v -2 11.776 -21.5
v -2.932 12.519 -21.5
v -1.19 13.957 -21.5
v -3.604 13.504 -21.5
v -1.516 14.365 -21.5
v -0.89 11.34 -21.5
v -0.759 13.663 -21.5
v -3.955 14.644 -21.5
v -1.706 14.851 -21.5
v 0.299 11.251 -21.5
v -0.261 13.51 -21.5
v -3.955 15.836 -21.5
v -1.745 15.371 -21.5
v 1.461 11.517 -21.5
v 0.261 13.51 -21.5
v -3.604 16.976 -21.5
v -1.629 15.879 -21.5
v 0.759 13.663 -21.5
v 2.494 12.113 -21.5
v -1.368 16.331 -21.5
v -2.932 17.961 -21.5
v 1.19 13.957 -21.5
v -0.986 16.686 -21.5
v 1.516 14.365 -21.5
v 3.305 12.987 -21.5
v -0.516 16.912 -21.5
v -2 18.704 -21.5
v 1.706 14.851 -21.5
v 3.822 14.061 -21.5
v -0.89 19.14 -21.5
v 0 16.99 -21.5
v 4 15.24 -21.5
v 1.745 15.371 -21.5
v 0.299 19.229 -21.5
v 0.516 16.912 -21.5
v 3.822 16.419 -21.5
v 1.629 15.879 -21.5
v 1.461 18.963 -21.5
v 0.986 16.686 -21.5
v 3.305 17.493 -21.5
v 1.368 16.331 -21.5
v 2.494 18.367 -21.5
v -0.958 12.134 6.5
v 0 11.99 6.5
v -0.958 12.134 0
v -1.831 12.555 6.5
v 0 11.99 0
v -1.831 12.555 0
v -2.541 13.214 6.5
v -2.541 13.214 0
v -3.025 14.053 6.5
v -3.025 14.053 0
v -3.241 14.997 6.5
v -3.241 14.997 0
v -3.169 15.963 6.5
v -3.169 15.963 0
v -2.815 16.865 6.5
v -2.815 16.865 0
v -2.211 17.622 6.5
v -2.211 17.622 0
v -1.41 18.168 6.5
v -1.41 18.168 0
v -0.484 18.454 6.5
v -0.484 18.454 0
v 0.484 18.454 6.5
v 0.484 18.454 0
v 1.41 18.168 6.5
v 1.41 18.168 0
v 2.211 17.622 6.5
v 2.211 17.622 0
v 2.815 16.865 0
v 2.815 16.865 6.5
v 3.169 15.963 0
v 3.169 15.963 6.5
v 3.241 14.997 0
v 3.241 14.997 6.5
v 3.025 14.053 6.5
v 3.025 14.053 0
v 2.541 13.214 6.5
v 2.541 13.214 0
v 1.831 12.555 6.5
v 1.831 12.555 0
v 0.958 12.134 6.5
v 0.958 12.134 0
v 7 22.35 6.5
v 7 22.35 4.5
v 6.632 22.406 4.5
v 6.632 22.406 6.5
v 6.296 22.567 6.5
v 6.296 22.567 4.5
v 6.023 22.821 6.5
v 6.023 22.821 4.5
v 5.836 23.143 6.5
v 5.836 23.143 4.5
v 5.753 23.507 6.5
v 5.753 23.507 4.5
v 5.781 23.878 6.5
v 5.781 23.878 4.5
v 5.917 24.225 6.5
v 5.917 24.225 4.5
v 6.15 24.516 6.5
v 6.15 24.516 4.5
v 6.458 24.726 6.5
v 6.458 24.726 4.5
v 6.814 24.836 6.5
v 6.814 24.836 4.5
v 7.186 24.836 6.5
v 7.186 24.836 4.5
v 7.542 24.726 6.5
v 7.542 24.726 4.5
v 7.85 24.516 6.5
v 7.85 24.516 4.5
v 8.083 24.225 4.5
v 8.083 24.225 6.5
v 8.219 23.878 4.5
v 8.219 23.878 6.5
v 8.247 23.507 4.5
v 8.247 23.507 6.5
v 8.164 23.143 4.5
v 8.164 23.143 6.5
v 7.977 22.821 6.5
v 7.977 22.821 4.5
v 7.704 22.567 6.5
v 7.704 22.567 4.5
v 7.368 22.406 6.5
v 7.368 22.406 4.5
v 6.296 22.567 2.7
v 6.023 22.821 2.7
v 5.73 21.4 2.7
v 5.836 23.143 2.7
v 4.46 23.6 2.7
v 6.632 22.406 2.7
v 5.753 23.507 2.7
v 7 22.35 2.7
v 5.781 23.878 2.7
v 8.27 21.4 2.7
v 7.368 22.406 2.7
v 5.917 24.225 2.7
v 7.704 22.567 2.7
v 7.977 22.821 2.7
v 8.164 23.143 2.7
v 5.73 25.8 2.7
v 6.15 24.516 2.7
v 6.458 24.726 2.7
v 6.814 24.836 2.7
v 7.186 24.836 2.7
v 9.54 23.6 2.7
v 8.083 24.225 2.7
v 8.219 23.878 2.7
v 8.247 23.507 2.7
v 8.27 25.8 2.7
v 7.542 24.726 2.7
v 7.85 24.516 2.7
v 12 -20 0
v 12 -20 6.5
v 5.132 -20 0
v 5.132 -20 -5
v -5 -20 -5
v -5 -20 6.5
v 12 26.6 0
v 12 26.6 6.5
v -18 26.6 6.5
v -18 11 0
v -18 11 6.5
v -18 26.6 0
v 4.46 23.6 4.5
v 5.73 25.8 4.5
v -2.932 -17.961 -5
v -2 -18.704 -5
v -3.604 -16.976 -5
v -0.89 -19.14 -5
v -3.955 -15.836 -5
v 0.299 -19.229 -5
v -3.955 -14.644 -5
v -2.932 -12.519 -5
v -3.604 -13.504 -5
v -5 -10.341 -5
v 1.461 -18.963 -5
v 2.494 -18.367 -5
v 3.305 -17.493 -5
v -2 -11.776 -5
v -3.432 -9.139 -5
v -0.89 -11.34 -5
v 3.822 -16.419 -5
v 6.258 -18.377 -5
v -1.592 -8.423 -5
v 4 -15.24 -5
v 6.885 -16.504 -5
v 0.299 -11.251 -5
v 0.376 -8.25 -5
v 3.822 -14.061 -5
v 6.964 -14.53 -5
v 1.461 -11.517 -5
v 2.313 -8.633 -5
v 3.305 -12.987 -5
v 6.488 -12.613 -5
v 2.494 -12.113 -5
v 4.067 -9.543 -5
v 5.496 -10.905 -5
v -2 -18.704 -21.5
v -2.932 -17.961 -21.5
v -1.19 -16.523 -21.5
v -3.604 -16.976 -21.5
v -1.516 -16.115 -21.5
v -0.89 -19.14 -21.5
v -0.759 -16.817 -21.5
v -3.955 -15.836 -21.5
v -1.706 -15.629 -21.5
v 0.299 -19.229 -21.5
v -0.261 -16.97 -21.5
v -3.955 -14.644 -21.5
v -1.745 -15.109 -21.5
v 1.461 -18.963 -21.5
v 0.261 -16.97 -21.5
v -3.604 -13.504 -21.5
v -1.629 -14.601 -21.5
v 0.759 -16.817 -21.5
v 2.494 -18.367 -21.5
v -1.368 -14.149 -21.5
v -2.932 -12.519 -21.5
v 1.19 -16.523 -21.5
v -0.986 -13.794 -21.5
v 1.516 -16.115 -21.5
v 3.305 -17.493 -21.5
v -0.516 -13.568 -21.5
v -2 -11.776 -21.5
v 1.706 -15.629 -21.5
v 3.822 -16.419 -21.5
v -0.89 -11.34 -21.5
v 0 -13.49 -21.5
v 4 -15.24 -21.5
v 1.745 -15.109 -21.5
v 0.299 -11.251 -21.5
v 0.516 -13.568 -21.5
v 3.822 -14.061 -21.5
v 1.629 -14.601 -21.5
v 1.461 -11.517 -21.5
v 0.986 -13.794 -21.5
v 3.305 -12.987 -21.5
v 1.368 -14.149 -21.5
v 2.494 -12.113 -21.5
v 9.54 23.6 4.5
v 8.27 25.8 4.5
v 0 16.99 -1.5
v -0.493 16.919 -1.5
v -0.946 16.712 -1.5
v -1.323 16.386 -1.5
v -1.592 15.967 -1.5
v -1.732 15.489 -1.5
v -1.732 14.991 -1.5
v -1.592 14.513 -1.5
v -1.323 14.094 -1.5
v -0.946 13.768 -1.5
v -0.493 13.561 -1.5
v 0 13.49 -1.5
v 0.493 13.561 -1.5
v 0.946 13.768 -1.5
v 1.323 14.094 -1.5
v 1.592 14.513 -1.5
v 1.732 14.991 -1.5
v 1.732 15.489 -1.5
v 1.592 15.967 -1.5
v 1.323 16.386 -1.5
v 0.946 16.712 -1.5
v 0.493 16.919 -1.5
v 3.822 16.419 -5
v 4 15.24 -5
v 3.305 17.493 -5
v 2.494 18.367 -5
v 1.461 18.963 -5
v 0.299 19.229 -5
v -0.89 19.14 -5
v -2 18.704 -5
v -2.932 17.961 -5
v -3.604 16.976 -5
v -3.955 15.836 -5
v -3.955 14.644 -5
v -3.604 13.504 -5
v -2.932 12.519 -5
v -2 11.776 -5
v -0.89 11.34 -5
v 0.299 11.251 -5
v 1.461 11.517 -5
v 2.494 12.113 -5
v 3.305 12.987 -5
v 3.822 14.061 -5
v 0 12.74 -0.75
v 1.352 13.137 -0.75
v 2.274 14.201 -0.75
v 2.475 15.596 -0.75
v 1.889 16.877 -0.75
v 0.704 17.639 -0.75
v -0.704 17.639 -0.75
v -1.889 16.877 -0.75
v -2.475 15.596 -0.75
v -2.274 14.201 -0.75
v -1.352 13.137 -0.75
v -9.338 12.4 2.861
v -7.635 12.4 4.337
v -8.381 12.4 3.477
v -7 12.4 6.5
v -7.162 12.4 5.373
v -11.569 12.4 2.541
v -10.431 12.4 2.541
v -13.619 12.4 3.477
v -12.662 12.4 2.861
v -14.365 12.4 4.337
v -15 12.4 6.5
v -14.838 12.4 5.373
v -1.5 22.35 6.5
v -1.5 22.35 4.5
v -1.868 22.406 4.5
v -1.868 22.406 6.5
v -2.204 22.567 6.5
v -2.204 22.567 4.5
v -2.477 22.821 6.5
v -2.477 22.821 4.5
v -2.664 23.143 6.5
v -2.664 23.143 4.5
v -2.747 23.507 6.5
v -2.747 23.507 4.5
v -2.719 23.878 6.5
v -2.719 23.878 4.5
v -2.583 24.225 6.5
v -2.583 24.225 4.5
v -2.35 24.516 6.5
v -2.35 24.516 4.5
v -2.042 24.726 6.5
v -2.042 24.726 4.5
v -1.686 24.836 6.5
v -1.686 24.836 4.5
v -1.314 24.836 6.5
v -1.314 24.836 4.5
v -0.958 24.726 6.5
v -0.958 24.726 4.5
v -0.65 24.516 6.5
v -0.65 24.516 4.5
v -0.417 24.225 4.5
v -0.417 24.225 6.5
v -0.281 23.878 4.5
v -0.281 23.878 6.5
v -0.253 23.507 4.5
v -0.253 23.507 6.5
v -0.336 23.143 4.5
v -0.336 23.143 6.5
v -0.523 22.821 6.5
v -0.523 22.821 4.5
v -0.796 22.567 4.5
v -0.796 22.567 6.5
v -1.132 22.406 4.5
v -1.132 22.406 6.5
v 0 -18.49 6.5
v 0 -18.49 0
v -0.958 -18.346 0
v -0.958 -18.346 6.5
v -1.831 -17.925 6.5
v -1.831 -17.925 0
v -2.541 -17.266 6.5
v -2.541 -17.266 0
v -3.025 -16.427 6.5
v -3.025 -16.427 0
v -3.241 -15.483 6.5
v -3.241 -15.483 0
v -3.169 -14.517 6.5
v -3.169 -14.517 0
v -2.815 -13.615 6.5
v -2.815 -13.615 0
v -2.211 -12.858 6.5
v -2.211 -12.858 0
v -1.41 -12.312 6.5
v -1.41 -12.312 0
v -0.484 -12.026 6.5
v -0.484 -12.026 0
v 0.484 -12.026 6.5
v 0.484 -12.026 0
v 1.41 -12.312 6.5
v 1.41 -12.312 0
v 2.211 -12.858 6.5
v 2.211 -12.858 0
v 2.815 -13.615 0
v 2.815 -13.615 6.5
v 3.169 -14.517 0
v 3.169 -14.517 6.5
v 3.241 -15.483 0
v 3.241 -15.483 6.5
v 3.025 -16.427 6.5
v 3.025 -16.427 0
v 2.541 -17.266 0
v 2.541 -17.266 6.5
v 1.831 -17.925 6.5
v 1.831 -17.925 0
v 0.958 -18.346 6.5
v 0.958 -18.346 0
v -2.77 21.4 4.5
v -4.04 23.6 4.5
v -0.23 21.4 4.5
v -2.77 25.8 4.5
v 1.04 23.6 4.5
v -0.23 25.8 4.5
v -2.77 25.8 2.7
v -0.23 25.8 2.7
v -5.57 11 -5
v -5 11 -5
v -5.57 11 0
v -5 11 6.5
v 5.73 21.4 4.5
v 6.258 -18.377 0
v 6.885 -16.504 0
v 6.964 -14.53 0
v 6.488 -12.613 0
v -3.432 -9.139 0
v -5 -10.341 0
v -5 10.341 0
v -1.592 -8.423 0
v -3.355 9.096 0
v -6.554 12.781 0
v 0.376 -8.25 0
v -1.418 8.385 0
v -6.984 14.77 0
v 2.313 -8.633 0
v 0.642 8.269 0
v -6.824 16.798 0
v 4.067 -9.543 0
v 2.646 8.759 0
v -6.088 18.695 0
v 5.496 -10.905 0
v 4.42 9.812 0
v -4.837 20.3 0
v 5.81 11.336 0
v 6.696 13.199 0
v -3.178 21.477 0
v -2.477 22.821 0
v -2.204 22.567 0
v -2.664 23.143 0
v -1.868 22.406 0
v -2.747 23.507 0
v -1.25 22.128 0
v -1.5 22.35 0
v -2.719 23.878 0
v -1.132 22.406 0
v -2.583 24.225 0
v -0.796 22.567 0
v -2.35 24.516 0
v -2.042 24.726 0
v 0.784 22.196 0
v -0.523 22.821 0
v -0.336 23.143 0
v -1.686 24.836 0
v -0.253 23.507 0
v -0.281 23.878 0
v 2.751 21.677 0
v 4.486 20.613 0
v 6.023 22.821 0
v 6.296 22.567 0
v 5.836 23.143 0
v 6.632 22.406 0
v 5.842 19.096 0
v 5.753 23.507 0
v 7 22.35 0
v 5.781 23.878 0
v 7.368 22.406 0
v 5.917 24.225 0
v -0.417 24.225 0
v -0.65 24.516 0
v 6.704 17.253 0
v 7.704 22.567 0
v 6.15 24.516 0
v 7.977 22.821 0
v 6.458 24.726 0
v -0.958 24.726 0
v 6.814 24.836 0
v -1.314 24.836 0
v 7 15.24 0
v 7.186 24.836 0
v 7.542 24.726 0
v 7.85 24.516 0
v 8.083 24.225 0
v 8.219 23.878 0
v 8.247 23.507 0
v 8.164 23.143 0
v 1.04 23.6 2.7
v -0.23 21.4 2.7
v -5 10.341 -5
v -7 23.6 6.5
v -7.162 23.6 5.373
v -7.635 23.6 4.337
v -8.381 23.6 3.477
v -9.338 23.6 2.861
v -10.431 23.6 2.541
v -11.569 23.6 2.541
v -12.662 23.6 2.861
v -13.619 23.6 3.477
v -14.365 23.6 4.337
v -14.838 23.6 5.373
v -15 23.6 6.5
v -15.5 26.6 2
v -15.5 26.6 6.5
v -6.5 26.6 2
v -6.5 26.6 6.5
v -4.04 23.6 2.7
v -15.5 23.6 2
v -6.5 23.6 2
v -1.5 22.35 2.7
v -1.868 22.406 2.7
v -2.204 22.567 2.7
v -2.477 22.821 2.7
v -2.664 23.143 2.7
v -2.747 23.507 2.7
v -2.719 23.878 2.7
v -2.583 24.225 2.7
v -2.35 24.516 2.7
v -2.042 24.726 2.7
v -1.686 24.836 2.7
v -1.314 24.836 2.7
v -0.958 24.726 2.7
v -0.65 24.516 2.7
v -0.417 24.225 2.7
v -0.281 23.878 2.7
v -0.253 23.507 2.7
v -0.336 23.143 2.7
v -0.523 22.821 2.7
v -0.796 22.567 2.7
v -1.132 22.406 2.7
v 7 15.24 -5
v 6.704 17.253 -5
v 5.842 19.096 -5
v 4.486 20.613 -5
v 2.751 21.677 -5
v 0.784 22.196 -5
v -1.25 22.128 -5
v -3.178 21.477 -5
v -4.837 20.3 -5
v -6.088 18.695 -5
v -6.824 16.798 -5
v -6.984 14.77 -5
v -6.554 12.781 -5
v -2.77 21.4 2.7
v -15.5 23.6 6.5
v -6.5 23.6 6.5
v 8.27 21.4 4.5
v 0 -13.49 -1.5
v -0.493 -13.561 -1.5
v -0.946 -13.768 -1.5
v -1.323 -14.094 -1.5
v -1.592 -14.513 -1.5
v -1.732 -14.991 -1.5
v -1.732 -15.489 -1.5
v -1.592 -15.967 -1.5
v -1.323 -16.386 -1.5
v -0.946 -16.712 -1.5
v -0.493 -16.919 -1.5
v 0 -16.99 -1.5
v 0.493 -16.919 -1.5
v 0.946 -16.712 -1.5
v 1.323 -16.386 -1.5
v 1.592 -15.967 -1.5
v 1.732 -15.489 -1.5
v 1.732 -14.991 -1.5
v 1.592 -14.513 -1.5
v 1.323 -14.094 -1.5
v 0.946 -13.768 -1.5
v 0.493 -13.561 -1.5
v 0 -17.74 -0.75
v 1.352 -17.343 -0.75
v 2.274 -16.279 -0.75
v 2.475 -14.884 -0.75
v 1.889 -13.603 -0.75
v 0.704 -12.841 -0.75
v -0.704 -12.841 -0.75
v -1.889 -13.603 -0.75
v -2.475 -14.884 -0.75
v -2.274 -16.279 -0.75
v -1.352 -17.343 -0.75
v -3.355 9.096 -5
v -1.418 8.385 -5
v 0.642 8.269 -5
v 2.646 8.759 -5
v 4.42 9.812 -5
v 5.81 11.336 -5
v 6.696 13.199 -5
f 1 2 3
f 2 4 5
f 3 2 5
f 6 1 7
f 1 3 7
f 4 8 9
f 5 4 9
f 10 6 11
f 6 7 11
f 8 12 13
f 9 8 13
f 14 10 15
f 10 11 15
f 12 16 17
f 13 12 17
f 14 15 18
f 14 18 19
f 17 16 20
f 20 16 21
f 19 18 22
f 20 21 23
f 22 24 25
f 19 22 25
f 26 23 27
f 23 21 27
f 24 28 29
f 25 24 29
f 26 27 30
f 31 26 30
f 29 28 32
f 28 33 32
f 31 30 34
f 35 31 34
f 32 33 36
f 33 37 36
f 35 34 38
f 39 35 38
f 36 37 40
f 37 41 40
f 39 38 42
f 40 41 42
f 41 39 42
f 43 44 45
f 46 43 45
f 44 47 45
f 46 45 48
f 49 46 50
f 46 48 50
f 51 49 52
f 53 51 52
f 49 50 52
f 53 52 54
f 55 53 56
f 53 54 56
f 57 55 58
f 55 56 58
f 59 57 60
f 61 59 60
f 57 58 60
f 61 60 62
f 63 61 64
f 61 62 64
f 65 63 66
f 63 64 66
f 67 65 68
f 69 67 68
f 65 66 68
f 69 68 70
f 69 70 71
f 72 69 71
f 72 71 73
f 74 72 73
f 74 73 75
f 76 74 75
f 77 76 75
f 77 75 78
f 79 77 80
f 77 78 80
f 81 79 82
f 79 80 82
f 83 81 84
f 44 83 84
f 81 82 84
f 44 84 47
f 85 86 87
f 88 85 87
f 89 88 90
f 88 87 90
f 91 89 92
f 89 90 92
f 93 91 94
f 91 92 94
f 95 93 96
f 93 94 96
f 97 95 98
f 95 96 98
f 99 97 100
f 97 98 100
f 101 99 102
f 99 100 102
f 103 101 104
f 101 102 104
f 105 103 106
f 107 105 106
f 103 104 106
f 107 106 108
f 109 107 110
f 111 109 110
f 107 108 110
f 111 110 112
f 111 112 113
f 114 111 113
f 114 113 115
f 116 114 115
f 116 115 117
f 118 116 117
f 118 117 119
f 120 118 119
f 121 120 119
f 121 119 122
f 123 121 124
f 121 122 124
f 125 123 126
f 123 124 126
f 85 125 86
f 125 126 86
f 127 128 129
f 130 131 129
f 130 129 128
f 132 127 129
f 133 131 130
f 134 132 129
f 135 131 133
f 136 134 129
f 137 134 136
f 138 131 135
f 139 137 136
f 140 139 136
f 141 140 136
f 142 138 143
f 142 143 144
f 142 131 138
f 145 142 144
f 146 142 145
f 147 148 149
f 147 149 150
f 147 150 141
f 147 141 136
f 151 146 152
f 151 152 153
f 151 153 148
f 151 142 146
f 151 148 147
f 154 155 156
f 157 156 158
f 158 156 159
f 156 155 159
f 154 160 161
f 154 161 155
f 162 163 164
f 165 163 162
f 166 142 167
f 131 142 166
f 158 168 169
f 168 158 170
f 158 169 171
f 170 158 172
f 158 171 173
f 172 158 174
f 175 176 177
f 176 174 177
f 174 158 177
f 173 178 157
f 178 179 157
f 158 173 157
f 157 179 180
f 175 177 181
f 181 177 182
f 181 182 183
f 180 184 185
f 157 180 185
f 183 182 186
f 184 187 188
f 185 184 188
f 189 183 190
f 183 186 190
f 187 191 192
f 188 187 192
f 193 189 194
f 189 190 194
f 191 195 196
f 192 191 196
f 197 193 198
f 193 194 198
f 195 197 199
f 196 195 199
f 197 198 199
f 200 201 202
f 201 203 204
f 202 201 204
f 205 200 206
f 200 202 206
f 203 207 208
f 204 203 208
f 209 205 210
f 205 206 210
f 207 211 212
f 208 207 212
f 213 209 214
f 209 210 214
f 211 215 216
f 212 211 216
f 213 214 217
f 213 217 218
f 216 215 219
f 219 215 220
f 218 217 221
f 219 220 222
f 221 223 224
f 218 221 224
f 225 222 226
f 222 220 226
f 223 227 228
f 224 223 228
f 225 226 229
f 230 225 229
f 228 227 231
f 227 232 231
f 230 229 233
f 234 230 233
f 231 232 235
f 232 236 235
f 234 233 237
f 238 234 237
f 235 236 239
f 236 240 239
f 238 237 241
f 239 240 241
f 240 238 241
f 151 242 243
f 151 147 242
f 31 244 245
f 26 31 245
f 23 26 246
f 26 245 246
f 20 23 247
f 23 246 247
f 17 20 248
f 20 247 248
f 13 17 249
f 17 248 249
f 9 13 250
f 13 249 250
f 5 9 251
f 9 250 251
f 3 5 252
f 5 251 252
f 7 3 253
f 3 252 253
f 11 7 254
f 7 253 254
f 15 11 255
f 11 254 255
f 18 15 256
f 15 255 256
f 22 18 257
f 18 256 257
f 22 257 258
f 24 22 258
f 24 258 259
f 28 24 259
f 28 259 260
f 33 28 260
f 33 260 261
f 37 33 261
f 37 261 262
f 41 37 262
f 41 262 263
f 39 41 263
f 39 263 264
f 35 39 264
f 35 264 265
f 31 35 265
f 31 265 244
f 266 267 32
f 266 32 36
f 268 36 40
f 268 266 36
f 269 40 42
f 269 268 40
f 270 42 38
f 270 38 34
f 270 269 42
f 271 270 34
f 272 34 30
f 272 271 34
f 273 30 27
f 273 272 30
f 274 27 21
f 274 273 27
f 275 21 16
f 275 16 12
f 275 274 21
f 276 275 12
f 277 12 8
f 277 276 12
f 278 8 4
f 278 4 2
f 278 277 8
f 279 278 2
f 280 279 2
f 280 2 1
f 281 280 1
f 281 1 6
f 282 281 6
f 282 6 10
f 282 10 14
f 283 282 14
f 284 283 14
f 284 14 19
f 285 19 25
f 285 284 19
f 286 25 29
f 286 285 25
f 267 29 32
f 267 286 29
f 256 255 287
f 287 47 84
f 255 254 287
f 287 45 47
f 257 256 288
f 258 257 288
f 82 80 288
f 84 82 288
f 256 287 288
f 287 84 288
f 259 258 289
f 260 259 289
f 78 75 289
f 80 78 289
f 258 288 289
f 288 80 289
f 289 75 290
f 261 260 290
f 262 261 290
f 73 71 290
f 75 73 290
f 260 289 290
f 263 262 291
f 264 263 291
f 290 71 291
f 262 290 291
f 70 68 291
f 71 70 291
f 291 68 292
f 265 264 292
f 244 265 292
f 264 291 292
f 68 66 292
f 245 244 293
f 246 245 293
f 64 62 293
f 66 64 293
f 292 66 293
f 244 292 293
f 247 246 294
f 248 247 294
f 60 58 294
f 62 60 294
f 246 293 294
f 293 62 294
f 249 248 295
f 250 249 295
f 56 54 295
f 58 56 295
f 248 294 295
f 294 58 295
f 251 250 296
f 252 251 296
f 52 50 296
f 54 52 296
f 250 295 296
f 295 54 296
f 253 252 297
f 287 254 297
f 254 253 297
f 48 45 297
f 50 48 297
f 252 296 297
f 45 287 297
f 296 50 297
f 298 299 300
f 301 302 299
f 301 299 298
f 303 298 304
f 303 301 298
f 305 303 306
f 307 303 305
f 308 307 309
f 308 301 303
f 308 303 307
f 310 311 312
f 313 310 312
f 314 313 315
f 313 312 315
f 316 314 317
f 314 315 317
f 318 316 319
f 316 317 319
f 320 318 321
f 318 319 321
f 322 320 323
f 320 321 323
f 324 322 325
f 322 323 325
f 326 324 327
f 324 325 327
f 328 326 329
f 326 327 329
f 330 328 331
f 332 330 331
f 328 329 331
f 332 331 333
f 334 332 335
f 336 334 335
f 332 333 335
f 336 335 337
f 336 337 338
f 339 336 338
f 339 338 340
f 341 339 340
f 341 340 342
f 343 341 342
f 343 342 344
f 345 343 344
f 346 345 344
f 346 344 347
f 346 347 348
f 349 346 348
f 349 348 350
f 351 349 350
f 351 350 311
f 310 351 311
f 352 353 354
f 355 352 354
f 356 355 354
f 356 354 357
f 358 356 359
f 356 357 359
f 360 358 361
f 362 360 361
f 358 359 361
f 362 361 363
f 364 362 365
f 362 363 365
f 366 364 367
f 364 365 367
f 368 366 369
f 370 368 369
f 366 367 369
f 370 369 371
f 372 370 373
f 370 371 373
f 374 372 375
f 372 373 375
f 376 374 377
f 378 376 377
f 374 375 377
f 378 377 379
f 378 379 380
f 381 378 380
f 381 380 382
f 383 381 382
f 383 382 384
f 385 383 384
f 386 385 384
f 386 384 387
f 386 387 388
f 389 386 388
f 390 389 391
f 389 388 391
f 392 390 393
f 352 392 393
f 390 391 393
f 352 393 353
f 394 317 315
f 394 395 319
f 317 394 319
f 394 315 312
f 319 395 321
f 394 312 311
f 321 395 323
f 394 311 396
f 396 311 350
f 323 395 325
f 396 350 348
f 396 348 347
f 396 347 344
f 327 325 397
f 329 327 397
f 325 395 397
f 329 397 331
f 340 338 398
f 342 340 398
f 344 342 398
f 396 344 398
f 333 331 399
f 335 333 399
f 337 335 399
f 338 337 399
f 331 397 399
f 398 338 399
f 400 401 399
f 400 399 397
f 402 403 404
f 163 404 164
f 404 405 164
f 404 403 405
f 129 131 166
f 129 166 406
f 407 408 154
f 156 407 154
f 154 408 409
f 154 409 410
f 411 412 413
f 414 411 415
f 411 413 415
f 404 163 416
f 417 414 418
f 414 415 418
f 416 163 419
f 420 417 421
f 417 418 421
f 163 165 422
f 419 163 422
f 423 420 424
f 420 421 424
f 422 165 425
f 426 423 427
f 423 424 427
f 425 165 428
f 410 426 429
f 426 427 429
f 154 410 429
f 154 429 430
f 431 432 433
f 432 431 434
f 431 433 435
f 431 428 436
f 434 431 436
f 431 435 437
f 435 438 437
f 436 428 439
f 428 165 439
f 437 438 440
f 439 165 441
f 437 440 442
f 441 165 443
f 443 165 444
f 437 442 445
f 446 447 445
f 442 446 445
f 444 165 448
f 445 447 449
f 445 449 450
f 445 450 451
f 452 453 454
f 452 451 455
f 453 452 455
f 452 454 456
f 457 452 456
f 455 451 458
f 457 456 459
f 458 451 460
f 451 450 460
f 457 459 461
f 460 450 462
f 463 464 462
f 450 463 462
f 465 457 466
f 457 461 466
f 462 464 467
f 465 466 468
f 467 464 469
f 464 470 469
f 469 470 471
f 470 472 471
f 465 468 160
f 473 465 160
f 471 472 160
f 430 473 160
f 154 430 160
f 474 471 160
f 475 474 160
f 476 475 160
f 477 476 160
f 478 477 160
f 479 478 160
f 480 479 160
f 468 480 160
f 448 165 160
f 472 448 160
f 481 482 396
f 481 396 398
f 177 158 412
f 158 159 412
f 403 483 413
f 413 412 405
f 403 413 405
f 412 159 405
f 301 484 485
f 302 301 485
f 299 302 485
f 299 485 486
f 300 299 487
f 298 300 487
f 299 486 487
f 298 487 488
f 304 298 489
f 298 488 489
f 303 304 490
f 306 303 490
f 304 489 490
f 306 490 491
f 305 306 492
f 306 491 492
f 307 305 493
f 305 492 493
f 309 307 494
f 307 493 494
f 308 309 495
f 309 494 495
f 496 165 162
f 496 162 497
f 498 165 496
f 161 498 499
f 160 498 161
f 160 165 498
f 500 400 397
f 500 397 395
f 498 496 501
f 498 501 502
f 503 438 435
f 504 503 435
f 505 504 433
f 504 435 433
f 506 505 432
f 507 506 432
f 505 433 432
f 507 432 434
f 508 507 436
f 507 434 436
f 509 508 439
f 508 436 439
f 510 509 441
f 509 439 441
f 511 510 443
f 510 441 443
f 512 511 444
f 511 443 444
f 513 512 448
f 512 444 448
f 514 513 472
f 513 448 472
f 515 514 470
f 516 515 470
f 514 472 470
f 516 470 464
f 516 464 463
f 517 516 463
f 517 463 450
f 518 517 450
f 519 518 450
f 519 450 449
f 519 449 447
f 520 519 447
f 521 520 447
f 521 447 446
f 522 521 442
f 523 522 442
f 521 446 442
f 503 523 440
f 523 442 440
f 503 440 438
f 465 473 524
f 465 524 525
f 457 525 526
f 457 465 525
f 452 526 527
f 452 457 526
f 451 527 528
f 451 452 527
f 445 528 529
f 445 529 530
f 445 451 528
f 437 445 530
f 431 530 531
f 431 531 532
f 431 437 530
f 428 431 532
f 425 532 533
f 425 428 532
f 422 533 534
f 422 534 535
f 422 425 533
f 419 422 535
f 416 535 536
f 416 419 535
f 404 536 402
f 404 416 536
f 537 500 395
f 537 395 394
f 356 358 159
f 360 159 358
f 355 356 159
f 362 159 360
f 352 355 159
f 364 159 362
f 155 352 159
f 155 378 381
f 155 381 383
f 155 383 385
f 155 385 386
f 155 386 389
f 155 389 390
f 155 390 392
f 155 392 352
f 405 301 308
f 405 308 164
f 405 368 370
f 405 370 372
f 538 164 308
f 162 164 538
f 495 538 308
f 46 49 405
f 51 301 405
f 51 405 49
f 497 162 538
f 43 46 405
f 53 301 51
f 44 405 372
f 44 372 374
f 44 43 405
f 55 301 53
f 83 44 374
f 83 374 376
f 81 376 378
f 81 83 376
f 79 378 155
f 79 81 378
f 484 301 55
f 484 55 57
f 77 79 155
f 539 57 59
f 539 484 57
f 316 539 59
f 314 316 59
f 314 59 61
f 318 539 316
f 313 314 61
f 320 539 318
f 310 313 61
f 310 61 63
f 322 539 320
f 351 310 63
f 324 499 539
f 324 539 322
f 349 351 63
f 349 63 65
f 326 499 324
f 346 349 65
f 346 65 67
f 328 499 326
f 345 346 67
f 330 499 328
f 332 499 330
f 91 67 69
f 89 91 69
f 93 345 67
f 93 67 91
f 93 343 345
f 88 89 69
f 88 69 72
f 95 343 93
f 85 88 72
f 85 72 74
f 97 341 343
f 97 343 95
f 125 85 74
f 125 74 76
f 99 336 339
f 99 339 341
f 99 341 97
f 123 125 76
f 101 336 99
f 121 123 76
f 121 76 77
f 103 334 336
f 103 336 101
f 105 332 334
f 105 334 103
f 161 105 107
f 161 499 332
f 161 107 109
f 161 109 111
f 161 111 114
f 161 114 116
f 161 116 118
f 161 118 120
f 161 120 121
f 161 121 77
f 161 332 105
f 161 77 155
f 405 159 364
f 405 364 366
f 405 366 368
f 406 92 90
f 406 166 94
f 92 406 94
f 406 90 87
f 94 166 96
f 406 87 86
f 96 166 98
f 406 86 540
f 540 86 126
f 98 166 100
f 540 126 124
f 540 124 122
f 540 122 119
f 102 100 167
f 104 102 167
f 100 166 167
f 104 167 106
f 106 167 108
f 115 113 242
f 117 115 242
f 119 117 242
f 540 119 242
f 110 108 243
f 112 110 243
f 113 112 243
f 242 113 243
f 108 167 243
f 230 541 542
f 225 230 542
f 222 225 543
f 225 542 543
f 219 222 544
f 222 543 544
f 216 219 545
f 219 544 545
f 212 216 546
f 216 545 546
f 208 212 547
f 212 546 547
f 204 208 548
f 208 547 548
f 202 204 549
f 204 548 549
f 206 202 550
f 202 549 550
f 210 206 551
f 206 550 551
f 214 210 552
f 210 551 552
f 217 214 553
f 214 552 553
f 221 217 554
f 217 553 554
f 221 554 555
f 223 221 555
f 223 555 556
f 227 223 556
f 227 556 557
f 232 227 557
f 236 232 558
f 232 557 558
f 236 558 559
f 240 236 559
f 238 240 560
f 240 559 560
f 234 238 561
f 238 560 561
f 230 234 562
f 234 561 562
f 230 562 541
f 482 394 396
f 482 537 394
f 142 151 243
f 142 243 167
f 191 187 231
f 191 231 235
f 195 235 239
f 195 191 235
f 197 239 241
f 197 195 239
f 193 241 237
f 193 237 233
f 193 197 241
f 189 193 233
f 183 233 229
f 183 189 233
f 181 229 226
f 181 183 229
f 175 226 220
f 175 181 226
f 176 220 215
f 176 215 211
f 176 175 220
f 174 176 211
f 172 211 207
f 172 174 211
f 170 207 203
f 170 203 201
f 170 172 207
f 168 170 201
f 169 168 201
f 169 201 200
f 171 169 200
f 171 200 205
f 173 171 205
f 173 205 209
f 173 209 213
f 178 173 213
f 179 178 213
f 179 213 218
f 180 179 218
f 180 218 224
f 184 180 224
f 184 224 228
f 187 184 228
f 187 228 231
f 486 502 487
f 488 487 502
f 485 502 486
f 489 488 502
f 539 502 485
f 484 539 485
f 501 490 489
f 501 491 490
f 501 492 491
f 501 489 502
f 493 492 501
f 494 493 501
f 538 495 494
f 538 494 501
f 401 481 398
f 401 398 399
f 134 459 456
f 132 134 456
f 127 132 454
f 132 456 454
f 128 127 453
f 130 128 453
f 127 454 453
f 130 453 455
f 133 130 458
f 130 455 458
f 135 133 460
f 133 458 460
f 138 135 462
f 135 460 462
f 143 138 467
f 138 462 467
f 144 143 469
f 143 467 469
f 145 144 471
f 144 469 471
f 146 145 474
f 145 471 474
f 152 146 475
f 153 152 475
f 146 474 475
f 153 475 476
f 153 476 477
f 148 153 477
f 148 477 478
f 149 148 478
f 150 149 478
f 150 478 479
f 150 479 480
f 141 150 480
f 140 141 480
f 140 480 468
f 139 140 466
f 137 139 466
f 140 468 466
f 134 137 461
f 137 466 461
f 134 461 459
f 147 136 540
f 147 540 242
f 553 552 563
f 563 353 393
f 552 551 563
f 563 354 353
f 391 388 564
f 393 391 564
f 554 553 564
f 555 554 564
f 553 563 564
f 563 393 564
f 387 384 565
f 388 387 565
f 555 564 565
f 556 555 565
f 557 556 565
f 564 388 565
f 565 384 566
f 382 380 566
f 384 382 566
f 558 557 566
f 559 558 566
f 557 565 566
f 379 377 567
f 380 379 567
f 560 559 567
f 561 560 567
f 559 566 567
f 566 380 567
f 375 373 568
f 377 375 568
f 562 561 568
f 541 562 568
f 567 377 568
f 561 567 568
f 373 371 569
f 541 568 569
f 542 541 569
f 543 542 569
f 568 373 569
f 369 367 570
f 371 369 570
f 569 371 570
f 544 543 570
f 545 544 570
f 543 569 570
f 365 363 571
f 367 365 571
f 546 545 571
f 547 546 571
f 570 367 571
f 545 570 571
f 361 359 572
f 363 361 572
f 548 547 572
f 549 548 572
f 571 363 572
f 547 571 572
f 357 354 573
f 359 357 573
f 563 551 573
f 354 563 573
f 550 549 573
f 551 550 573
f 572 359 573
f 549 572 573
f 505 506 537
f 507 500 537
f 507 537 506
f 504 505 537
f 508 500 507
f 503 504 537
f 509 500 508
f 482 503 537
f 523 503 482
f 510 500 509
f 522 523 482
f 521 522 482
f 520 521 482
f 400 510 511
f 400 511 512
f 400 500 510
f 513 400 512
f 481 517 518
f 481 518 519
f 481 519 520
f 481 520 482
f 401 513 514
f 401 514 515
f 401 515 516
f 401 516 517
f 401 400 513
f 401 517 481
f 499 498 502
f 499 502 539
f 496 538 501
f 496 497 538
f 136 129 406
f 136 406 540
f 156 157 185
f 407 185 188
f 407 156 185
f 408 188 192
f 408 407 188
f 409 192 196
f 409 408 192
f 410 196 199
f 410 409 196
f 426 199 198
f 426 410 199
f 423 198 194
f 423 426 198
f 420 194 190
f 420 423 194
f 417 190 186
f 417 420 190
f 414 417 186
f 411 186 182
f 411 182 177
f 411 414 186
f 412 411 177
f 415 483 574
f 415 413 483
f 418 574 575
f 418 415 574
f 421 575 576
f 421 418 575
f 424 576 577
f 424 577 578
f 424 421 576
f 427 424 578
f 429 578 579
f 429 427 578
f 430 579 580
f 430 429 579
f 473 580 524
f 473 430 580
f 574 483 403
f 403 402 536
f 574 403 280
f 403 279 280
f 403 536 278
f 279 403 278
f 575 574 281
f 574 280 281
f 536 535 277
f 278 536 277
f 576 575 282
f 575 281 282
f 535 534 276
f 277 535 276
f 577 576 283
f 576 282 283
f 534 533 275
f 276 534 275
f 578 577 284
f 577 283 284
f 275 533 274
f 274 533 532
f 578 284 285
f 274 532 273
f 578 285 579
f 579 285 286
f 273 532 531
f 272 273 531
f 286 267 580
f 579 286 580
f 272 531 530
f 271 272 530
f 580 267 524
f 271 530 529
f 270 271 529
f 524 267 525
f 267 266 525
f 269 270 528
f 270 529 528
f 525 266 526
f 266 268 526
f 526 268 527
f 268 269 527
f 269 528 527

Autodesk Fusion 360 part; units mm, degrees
sketch "Skizze1" plane through (0, 0, 0) normal (0, 0, 1) x (1, 0, 0)
  line L0 (12, -20) -> (-18, -20)
  line L1 (-18, -20) -> (-18, 26.6)
  line L2 (-18, 26.6) -> (12, 26.6)
  line L3 (12, 26.6) -> (12, -20)
  line L4 (-36.0472, 15.24) -> (32.5304, 15.24) construction
  line L5 (-35.3146, -15.24) -> (27.6948, -15.24) construction
  circle A0 centre (0, 15.24) radius 4
  circle A1 centre (0, -15.24) radius 4
  line L6 (-5, -20) -> (-5, 11)
  line L7 (-5, 11) -> (-18, 11)
  circle A2 centre (0, 15.24) radius 7
  circle A3 centre (0, -15.24) radius 7
  line L8 (0, 19) -> (0, -24.3873) construction
  point P0 (0, 15.24)
  point P1 (0, -15.24)
  dimension "d3" = 20
  dimension "d4" = 26.6
  dimension "d5" = 12
  dimension "d6" = 18
  dimension "d7" = 15.24
  dimension "d8" = 15.24
  dimension "d9" = 8
  dimension "d10" = 8
  dimension "d45" = 13
  dimension "d46" = 31
  dimension "d47" = 14
  dimension "d48" = 14
extrude "Extrusion1" add sketch "Skizze1" along normal blind 6.5 contours L0 L1 L2 L3 L6 L7 A2 A3 | L0 L6 A3 | L6 L7 A2 | A0 | A1 picked at (-4.6667, -15.1937) picked at (-3.9058, 10.9235)
sketch "Skizze2" plane through (0, 26.6, 0) normal (0, 1, 0) x (-1, 0, 0)
  line L0 (-12, 0) -> (18, 0)
  line L1 (18, 0) -> (18, 6.5)
  line L2 (18, 6.5) -> (-12, 6.5)
  line L3 (-12, 6.5) -> (-12, 0)
  line L4 (11, 13.5) -> (11, -12.5) construction
  line L5 (6.5, 6.5) -> (15.5, 6.5)
  line L6 (15.5, 6.5) -> (15.5, 2)
  line L7 (15.5, 2) -> (6.5, 2)
  line L8 (6.5, 2) -> (6.5, 6.5)
  line L9 (7, 8.5) -> (7, -2.5) construction
  line L10 (15, 8.4924) -> (15, -3.3602) construction
  arc A0 (7, 6.5) -> (15, 6.5) centre (11, 6.5) ccw
  point P0 (7, 6.5)
  point P1 (7, 6.5)
  point P2 (11, 6.5)
  dimension "d13" = 7
  dimension "d14" = 4.5
  dimension "d15" = 4.5
  dimension "d16" = 4.5
  dimension "d17" = 4
  dimension "d18" = 4
extrude "Extrusion2" cut sketch "Skizze2" against normal blind 3 contours L2 L5 L6 L7 L8 A0
extrude "Extrusion3" cut sketch "Skizze2" against normal blind 14.2 contours L2 L5 A0
extrude "Extrusion6" add sketch "Skizze1" against normal blind 5 contours L0 L6 A3 picked at (-4.6667, -15.1937)
extrude "Extrusion7" add sketch "Skizze1" against normal blind 5 contours L6 L7 A2 picked at (-3.9058, 10.9235)
extrude "Extrusion4" add sketch "Skizze1" against normal blind 21.5 contours A0 | A1
sketch "Skizze3" plane through (0, 0, -21.5) normal (0, 0, -1) x (1, 0, 0)
  circle A0 centre (0, -15.24) radius 4
  line L0 (0, -27) -> (0, 23.61) construction
  line L1 (21.7334, -15.24) -> (-22.4317, -15.24) construction
  line L2 (22.3444, 15.24) -> (-24, 15.24) construction
  point P0 (0, -15.24)
  point P1 (0, 15.24)
  dimension "d25" = 15.24
  dimension "d26" = 15.24
hole "Bohrung1" at (0, 15.24, -21.5) at (0, -15.24, -21.5) direction (0, 0, 1) diameter 3.5 depth 30 tip angle 180
sketch "Skizze6" plane through (0, 0, 6.5) normal (0, 0, 1) x (-1, 0, 0)
  line L0 (15, -12.4) -> (15, -23.6)
  line L1 (15, -23.6) -> (15.5, -23.6)
  line L2 (15.5, -23.6) -> (15.5, -26.6)
  line L3 (15.5, -26.6) -> (18, -26.6)
  line L4 (18, -26.6) -> (18, -11)
  line L5 (18, -11) -> (5, -11)
  line L6 (5, -11) -> (5, 20)
  line L7 (5, 20) -> (-12, 20)
  line L8 (-12, 20) -> (-12, -26.6)
  line L9 (-12, -26.6) -> (6.5, -26.6)
  line L10 (6.5, -26.6) -> (6.5, -23.6)
  line L11 (6.5, -23.6) -> (7, -23.6)
  line L12 (7, -23.6) -> (7, -12.4)
  line L13 (7, -12.4) -> (15, -12.4)
  line L14 (22.7431, -15.24) -> (-23, -15.24) construction
  line L15 (16, 15.24) -> (-23, 15.24) construction
  line L16 (0, -29.9031) -> (0, 26.376) construction
  circle A0 centre (0, -15.24) radius 1.75
  circle A1 centre (0, 15.24) radius 1.75
  point P0 (0, -15.24)
  point P1 (0, 15.24)
  dimension "d53" = 15.24
  dimension "d54" = 15.24
hole "Bohrung3" at (0, 15.24, 6.5) at (0, -15.24, 6.5) direction (0, 0, -1) diameter 6.5 depth 6.5 tip angle 90
sketch "Skizze4" plane through (0, 0, 6.5) normal (0, 0, 1) x (-1, 0, 0)
  line L0 (15, -12.4) -> (15, -23.6)
  line L1 (15, -23.6) -> (15.5, -23.6)
  line L2 (15.5, -23.6) -> (15.5, -26.6)
  line L3 (15.5, -26.6) -> (18, -26.6)
  line L4 (18, -26.6) -> (18, -11)
  line L5 (5, 20) -> (-12, 20)
  line L6 (-12, 20) -> (-12, -26.6)
  line L7 (-12, -26.6) -> (6.5, -26.6)
  line L8 (6.5, -26.6) -> (6.5, -23.6)
  line L9 (6.5, -23.6) -> (7, -23.6)
  line L10 (7, -23.6) -> (7, -12.4)
  line L11 (7, -12.4) -> (15, -12.4)
  line L12 (-23.7996, -23.6) -> (40, -23.6) construction
  line L13 (-7, -34.5714) -> (-7, -14.6073) construction
  line L14 (1.5, -34.5334) -> (1.5, -15.6973) construction
  line L15 (-12, -26.6) -> (-12, 20)
  line L16 (18, -11) -> (5, -11)
  line L17 (5, -11) -> (5, 20)
  circle A0 centre (0, -15.24) radius 3.25
  circle A1 centre (0, 15.24) radius 3.25
  point P0 (-7, -23.6)
  point P1 (1.5, -23.6)
  dimension "d30" = 3
  dimension "d31" = 5
  dimension "d32" = 5
  dimension "d33" = 8.5
hole "Bohrung2" at (7, 23.6, 6.5) at (-1.5, 23.6, 6.5) direction (0, 0, -1) diameter 2.5 depth 8 tip angle 180
ref_plane "Arbeitsebene1" through (0, 0, 2.7) normal (0, 0, 1) x (1, 0, 0)
sketch "Skizze5" plane through (0, 0, 2.7) normal (0, 0, 1) x (1, 0, 0)
  line L0 (18, 23.6) -> (-21, 23.6) construction
  line L1 (-18, 26.6) -> (12, 26.6)
  line L2 (7, 19.6167) -> (7, 31.5736) construction
  line L3 (-1.5, 19.6924) -> (-1.5, 31.9243) construction
  line L4 (12, 26.6) -> (12, -20)
  line L5 (5.7298, 25.8) -> (4.4597, 23.6)
  line L6 (4.4597, 23.6) -> (5.7298, 21.4)
  line L7 (5.7298, 21.4) -> (8.2702, 21.4)
  line L8 (8.2702, 21.4) -> (9.5403, 23.6)
  line L9 (9.5403, 23.6) -> (8.2702, 25.8)
  line L10 (8.2702, 25.8) -> (5.7298, 25.8)
  line L11 (-2.7702, 25.8) -> (-4.0403, 23.6)
  line L12 (-4.0403, 23.6) -> (-2.7702, 21.4)
  line L13 (-2.7702, 21.4) -> (-0.2298, 21.4)
  line L14 (-0.2298, 21.4) -> (1.0403, 23.6)
  line L15 (1.0403, 23.6) -> (-0.2298, 25.8)
  line L16 (-0.2298, 25.8) -> (-2.7702, 25.8)
  point P0 (7, 23.6)
  point P1 (-1.5, 23.6)
  dimension "d38" = 3
  dimension "d39" = 5
  dimension "d40" = 8.5
  dimension "d41" = 4.4
  dimension "d42" = 4.4
extrude "Extrusion5" cut sketch "Skizze5" along normal blind 1.8
